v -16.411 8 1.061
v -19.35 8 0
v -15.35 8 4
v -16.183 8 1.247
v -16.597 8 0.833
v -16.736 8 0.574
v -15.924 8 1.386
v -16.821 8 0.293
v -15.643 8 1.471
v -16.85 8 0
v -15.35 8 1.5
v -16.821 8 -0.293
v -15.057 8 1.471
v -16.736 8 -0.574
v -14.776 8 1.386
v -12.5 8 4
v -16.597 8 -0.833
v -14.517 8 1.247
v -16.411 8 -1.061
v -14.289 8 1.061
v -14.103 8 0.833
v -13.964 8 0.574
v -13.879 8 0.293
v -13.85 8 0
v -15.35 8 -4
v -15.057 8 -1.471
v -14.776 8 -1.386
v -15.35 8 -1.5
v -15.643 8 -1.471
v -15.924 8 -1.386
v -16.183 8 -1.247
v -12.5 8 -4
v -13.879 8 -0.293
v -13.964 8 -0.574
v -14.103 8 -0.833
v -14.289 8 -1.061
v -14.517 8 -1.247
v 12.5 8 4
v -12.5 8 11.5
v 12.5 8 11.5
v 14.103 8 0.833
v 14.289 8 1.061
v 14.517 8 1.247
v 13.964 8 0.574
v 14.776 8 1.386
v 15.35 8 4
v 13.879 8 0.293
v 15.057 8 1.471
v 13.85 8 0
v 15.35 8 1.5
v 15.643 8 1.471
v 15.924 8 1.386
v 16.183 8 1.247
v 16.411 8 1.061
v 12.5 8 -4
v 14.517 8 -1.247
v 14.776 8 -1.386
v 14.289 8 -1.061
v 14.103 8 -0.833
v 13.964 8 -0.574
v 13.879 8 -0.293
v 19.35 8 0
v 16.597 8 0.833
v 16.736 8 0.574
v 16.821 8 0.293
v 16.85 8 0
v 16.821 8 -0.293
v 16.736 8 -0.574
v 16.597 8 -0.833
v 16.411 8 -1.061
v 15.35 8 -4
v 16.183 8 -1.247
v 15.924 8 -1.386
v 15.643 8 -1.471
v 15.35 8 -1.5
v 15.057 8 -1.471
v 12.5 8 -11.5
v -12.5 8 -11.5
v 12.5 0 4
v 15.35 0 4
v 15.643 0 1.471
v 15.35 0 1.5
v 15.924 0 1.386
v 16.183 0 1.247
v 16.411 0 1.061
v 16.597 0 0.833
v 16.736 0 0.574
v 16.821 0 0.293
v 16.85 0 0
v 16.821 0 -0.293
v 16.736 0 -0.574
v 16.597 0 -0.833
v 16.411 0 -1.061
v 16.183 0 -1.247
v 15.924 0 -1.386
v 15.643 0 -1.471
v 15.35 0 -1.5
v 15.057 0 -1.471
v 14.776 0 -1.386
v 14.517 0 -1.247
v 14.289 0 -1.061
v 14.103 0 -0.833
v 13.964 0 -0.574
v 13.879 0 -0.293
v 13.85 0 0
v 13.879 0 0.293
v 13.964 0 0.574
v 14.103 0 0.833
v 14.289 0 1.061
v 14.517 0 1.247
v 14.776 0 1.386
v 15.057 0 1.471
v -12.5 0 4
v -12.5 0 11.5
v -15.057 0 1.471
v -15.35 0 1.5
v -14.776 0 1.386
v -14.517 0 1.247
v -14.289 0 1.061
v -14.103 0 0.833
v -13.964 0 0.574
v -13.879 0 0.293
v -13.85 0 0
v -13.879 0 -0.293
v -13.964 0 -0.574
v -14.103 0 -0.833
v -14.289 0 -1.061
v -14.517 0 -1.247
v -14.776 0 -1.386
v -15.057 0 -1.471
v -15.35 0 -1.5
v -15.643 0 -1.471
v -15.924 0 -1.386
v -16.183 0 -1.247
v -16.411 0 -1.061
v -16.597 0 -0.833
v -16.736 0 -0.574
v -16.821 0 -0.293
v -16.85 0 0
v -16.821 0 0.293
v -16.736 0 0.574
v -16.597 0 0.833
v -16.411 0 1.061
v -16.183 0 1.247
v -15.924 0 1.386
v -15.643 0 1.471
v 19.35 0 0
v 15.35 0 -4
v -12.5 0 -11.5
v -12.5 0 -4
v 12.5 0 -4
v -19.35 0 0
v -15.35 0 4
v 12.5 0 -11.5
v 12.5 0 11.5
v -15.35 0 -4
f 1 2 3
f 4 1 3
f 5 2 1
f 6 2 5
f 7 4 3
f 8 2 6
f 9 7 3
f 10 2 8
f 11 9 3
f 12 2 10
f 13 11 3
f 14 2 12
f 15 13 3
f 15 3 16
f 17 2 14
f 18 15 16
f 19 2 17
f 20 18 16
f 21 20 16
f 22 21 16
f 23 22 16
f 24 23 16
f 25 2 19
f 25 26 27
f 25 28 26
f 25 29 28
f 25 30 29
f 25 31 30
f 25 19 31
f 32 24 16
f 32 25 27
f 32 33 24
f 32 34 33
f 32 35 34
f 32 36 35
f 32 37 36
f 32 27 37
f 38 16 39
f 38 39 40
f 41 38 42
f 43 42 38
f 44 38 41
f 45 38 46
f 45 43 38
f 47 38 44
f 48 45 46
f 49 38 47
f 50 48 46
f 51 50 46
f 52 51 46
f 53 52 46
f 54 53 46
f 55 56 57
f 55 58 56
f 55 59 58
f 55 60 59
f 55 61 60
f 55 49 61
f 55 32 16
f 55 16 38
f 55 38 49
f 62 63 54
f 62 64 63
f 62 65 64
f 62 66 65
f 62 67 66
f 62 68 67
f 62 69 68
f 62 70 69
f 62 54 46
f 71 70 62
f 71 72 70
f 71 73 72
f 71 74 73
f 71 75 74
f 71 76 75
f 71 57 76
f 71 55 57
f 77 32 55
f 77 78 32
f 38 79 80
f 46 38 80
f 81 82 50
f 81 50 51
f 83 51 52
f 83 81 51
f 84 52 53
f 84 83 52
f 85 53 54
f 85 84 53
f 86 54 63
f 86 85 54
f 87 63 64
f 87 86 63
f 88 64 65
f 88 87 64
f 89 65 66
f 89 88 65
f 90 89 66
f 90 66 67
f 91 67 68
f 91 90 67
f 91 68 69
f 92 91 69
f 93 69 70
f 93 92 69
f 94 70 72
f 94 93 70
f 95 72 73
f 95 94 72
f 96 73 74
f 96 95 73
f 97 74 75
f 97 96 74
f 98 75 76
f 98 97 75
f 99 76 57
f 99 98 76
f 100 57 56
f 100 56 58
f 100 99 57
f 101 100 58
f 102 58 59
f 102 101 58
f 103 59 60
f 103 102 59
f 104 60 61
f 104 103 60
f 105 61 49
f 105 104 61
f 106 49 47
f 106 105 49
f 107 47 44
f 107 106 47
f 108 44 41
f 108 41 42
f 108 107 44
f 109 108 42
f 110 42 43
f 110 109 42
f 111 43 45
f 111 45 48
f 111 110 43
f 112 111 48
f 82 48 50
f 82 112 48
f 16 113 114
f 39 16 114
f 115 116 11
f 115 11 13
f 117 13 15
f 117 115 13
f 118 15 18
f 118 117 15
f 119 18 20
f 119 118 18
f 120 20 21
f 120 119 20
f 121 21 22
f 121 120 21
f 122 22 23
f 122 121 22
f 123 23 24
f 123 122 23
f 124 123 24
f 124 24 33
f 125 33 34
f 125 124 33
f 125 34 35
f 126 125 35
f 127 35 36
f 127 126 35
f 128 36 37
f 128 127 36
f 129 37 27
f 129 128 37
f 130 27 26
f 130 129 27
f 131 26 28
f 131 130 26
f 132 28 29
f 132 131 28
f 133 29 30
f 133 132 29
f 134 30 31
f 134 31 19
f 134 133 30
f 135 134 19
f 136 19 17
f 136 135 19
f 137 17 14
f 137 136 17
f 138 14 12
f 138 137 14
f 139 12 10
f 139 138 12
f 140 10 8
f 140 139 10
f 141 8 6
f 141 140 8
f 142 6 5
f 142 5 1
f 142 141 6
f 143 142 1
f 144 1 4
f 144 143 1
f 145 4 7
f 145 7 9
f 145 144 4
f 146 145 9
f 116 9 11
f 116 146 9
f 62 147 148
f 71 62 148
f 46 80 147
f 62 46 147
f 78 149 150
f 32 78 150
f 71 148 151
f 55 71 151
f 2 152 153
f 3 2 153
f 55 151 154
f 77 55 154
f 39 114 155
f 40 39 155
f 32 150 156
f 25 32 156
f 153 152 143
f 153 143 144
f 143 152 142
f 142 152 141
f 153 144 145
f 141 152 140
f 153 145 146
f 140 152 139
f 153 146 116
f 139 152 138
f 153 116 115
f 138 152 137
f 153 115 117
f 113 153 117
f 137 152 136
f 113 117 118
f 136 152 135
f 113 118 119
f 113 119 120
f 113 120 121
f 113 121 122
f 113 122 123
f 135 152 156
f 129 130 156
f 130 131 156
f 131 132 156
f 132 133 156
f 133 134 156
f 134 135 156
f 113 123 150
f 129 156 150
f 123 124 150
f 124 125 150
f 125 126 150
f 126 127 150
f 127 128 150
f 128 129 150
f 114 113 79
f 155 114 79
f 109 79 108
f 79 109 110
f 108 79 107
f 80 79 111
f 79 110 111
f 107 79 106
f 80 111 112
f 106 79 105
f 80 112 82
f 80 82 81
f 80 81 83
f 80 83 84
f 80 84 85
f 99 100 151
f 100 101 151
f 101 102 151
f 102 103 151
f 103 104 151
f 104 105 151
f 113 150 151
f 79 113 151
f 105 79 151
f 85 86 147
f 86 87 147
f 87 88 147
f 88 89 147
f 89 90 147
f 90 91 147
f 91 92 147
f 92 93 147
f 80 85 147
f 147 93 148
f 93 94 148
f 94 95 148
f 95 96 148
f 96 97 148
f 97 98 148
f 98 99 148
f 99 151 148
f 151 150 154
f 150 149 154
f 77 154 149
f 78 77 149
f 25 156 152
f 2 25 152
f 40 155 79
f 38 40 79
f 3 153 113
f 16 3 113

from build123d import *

# Parameters (mm, degrees)
SKETCH_1_R           = 1.5
F_8MM_DEPTH          = 8
MOVE_FACE_25_23_BY   = 1
MOVE_FACE_25_23_2_BY = 1


with BuildPart() as part:
    # 草图1 → 外壳模块组合包络_厚度暂估8mm (new body)
    with BuildSketch(Plane(origin=(0, 0, 0), x_dir=(1, 0, 0), z_dir=(0, 1, 0))):
        Polygon((-19.35, 0), (-15.35, -4), (-12.5, -4), (-12.5, -12.5), (12.5, -12.5), (12.5, -4), (15.35, -4), (19.35, 0), (15.35, 4), (12.5, 4), (12.5, 12.5), (-12.5, 12.5), (-12.5, 4), (-15.35, 4), align=None)
        with Locations(Location((-15.35, 0, 0), (0, 0, 270))):
            Circle(SKETCH_1_R, mode=Mode.SUBTRACT)
        with Locations(Location((15.35, 0, 0), (0, 0, 270))):
            Circle(SKETCH_1_R, mode=Mode.SUBTRACT)
    extrude(amount=F_8MM_DEPTH)

    # Move Face 25_23: a face moved inward by 1.0
    extrude(part.faces().sort_by_distance((0, 4, -12.5))[0], amount=MOVE_FACE_25_23_BY, dir=(0, 0, 1), mode=Mode.SUBTRACT)

    # Move Face 25_23 2: a face moved inward by 1.0
    extrude(part.faces().sort_by_distance((0, 4, 12.5))[0], amount=MOVE_FACE_25_23_2_BY, dir=(0, 0, -1), mode=Mode.SUBTRACT)


solid = part.part
